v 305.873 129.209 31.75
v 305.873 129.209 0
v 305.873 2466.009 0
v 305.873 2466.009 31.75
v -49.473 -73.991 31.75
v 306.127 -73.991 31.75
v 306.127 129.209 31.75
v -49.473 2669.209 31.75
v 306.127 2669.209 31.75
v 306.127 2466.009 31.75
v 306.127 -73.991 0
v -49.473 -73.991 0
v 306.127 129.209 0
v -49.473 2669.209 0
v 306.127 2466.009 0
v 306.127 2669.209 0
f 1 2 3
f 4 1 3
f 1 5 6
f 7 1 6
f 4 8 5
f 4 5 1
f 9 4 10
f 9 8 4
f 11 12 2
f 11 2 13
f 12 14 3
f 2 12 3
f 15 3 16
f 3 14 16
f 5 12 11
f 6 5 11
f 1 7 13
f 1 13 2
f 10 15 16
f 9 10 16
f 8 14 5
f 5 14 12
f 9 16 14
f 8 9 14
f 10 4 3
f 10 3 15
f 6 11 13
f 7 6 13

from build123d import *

# Parameters (mm, degrees)
F0_W     = 118.618
F0_H     = 2336.8
F0_W_2   = 118.364
F1_DEPTH = 31.75


# Not quite as in the source:
# - a feature names something its author has since deleted; it is built from what else it names


with BuildPart() as f1:
    # F0 (on Top) → F1 (new body)
    with BuildSketch(Plane.XY):
        Polygon((-49.4727902114, 129.2092303157), (-49.4727902114, -73.9907696843), (306.1272097886, -73.9907696843), (306.1272097886, 129.2092303157), (305.8732097886, 129.2092303157), (187.2552097886, 129.2092303157), (68.8912097886, 129.2092303157), align=None)
        with Locations((246.5642097886, 1297.6092303157)):
            Rectangle(F0_W, F0_H)
        with Locations((128.0732097886, 1297.6092303157)):
            Rectangle(F0_W_2, F0_H)
        with Locations((9.7092097886, 1297.6092303157)):
            Rectangle(F0_W_2, F0_H)
        Polygon((-49.4727902114, 2669.2092303157), (-49.4727902114, 2466.0092303157), (68.8912097886, 2466.0092303157), (187.2552097886, 2466.0092303157), (305.8732097886, 2466.0092303157), (306.1272097886, 2466.0092303157), (306.1272097886, 2669.2092303157), align=None)
    extrude(amount=F1_DEPTH)


solid = f1.part
